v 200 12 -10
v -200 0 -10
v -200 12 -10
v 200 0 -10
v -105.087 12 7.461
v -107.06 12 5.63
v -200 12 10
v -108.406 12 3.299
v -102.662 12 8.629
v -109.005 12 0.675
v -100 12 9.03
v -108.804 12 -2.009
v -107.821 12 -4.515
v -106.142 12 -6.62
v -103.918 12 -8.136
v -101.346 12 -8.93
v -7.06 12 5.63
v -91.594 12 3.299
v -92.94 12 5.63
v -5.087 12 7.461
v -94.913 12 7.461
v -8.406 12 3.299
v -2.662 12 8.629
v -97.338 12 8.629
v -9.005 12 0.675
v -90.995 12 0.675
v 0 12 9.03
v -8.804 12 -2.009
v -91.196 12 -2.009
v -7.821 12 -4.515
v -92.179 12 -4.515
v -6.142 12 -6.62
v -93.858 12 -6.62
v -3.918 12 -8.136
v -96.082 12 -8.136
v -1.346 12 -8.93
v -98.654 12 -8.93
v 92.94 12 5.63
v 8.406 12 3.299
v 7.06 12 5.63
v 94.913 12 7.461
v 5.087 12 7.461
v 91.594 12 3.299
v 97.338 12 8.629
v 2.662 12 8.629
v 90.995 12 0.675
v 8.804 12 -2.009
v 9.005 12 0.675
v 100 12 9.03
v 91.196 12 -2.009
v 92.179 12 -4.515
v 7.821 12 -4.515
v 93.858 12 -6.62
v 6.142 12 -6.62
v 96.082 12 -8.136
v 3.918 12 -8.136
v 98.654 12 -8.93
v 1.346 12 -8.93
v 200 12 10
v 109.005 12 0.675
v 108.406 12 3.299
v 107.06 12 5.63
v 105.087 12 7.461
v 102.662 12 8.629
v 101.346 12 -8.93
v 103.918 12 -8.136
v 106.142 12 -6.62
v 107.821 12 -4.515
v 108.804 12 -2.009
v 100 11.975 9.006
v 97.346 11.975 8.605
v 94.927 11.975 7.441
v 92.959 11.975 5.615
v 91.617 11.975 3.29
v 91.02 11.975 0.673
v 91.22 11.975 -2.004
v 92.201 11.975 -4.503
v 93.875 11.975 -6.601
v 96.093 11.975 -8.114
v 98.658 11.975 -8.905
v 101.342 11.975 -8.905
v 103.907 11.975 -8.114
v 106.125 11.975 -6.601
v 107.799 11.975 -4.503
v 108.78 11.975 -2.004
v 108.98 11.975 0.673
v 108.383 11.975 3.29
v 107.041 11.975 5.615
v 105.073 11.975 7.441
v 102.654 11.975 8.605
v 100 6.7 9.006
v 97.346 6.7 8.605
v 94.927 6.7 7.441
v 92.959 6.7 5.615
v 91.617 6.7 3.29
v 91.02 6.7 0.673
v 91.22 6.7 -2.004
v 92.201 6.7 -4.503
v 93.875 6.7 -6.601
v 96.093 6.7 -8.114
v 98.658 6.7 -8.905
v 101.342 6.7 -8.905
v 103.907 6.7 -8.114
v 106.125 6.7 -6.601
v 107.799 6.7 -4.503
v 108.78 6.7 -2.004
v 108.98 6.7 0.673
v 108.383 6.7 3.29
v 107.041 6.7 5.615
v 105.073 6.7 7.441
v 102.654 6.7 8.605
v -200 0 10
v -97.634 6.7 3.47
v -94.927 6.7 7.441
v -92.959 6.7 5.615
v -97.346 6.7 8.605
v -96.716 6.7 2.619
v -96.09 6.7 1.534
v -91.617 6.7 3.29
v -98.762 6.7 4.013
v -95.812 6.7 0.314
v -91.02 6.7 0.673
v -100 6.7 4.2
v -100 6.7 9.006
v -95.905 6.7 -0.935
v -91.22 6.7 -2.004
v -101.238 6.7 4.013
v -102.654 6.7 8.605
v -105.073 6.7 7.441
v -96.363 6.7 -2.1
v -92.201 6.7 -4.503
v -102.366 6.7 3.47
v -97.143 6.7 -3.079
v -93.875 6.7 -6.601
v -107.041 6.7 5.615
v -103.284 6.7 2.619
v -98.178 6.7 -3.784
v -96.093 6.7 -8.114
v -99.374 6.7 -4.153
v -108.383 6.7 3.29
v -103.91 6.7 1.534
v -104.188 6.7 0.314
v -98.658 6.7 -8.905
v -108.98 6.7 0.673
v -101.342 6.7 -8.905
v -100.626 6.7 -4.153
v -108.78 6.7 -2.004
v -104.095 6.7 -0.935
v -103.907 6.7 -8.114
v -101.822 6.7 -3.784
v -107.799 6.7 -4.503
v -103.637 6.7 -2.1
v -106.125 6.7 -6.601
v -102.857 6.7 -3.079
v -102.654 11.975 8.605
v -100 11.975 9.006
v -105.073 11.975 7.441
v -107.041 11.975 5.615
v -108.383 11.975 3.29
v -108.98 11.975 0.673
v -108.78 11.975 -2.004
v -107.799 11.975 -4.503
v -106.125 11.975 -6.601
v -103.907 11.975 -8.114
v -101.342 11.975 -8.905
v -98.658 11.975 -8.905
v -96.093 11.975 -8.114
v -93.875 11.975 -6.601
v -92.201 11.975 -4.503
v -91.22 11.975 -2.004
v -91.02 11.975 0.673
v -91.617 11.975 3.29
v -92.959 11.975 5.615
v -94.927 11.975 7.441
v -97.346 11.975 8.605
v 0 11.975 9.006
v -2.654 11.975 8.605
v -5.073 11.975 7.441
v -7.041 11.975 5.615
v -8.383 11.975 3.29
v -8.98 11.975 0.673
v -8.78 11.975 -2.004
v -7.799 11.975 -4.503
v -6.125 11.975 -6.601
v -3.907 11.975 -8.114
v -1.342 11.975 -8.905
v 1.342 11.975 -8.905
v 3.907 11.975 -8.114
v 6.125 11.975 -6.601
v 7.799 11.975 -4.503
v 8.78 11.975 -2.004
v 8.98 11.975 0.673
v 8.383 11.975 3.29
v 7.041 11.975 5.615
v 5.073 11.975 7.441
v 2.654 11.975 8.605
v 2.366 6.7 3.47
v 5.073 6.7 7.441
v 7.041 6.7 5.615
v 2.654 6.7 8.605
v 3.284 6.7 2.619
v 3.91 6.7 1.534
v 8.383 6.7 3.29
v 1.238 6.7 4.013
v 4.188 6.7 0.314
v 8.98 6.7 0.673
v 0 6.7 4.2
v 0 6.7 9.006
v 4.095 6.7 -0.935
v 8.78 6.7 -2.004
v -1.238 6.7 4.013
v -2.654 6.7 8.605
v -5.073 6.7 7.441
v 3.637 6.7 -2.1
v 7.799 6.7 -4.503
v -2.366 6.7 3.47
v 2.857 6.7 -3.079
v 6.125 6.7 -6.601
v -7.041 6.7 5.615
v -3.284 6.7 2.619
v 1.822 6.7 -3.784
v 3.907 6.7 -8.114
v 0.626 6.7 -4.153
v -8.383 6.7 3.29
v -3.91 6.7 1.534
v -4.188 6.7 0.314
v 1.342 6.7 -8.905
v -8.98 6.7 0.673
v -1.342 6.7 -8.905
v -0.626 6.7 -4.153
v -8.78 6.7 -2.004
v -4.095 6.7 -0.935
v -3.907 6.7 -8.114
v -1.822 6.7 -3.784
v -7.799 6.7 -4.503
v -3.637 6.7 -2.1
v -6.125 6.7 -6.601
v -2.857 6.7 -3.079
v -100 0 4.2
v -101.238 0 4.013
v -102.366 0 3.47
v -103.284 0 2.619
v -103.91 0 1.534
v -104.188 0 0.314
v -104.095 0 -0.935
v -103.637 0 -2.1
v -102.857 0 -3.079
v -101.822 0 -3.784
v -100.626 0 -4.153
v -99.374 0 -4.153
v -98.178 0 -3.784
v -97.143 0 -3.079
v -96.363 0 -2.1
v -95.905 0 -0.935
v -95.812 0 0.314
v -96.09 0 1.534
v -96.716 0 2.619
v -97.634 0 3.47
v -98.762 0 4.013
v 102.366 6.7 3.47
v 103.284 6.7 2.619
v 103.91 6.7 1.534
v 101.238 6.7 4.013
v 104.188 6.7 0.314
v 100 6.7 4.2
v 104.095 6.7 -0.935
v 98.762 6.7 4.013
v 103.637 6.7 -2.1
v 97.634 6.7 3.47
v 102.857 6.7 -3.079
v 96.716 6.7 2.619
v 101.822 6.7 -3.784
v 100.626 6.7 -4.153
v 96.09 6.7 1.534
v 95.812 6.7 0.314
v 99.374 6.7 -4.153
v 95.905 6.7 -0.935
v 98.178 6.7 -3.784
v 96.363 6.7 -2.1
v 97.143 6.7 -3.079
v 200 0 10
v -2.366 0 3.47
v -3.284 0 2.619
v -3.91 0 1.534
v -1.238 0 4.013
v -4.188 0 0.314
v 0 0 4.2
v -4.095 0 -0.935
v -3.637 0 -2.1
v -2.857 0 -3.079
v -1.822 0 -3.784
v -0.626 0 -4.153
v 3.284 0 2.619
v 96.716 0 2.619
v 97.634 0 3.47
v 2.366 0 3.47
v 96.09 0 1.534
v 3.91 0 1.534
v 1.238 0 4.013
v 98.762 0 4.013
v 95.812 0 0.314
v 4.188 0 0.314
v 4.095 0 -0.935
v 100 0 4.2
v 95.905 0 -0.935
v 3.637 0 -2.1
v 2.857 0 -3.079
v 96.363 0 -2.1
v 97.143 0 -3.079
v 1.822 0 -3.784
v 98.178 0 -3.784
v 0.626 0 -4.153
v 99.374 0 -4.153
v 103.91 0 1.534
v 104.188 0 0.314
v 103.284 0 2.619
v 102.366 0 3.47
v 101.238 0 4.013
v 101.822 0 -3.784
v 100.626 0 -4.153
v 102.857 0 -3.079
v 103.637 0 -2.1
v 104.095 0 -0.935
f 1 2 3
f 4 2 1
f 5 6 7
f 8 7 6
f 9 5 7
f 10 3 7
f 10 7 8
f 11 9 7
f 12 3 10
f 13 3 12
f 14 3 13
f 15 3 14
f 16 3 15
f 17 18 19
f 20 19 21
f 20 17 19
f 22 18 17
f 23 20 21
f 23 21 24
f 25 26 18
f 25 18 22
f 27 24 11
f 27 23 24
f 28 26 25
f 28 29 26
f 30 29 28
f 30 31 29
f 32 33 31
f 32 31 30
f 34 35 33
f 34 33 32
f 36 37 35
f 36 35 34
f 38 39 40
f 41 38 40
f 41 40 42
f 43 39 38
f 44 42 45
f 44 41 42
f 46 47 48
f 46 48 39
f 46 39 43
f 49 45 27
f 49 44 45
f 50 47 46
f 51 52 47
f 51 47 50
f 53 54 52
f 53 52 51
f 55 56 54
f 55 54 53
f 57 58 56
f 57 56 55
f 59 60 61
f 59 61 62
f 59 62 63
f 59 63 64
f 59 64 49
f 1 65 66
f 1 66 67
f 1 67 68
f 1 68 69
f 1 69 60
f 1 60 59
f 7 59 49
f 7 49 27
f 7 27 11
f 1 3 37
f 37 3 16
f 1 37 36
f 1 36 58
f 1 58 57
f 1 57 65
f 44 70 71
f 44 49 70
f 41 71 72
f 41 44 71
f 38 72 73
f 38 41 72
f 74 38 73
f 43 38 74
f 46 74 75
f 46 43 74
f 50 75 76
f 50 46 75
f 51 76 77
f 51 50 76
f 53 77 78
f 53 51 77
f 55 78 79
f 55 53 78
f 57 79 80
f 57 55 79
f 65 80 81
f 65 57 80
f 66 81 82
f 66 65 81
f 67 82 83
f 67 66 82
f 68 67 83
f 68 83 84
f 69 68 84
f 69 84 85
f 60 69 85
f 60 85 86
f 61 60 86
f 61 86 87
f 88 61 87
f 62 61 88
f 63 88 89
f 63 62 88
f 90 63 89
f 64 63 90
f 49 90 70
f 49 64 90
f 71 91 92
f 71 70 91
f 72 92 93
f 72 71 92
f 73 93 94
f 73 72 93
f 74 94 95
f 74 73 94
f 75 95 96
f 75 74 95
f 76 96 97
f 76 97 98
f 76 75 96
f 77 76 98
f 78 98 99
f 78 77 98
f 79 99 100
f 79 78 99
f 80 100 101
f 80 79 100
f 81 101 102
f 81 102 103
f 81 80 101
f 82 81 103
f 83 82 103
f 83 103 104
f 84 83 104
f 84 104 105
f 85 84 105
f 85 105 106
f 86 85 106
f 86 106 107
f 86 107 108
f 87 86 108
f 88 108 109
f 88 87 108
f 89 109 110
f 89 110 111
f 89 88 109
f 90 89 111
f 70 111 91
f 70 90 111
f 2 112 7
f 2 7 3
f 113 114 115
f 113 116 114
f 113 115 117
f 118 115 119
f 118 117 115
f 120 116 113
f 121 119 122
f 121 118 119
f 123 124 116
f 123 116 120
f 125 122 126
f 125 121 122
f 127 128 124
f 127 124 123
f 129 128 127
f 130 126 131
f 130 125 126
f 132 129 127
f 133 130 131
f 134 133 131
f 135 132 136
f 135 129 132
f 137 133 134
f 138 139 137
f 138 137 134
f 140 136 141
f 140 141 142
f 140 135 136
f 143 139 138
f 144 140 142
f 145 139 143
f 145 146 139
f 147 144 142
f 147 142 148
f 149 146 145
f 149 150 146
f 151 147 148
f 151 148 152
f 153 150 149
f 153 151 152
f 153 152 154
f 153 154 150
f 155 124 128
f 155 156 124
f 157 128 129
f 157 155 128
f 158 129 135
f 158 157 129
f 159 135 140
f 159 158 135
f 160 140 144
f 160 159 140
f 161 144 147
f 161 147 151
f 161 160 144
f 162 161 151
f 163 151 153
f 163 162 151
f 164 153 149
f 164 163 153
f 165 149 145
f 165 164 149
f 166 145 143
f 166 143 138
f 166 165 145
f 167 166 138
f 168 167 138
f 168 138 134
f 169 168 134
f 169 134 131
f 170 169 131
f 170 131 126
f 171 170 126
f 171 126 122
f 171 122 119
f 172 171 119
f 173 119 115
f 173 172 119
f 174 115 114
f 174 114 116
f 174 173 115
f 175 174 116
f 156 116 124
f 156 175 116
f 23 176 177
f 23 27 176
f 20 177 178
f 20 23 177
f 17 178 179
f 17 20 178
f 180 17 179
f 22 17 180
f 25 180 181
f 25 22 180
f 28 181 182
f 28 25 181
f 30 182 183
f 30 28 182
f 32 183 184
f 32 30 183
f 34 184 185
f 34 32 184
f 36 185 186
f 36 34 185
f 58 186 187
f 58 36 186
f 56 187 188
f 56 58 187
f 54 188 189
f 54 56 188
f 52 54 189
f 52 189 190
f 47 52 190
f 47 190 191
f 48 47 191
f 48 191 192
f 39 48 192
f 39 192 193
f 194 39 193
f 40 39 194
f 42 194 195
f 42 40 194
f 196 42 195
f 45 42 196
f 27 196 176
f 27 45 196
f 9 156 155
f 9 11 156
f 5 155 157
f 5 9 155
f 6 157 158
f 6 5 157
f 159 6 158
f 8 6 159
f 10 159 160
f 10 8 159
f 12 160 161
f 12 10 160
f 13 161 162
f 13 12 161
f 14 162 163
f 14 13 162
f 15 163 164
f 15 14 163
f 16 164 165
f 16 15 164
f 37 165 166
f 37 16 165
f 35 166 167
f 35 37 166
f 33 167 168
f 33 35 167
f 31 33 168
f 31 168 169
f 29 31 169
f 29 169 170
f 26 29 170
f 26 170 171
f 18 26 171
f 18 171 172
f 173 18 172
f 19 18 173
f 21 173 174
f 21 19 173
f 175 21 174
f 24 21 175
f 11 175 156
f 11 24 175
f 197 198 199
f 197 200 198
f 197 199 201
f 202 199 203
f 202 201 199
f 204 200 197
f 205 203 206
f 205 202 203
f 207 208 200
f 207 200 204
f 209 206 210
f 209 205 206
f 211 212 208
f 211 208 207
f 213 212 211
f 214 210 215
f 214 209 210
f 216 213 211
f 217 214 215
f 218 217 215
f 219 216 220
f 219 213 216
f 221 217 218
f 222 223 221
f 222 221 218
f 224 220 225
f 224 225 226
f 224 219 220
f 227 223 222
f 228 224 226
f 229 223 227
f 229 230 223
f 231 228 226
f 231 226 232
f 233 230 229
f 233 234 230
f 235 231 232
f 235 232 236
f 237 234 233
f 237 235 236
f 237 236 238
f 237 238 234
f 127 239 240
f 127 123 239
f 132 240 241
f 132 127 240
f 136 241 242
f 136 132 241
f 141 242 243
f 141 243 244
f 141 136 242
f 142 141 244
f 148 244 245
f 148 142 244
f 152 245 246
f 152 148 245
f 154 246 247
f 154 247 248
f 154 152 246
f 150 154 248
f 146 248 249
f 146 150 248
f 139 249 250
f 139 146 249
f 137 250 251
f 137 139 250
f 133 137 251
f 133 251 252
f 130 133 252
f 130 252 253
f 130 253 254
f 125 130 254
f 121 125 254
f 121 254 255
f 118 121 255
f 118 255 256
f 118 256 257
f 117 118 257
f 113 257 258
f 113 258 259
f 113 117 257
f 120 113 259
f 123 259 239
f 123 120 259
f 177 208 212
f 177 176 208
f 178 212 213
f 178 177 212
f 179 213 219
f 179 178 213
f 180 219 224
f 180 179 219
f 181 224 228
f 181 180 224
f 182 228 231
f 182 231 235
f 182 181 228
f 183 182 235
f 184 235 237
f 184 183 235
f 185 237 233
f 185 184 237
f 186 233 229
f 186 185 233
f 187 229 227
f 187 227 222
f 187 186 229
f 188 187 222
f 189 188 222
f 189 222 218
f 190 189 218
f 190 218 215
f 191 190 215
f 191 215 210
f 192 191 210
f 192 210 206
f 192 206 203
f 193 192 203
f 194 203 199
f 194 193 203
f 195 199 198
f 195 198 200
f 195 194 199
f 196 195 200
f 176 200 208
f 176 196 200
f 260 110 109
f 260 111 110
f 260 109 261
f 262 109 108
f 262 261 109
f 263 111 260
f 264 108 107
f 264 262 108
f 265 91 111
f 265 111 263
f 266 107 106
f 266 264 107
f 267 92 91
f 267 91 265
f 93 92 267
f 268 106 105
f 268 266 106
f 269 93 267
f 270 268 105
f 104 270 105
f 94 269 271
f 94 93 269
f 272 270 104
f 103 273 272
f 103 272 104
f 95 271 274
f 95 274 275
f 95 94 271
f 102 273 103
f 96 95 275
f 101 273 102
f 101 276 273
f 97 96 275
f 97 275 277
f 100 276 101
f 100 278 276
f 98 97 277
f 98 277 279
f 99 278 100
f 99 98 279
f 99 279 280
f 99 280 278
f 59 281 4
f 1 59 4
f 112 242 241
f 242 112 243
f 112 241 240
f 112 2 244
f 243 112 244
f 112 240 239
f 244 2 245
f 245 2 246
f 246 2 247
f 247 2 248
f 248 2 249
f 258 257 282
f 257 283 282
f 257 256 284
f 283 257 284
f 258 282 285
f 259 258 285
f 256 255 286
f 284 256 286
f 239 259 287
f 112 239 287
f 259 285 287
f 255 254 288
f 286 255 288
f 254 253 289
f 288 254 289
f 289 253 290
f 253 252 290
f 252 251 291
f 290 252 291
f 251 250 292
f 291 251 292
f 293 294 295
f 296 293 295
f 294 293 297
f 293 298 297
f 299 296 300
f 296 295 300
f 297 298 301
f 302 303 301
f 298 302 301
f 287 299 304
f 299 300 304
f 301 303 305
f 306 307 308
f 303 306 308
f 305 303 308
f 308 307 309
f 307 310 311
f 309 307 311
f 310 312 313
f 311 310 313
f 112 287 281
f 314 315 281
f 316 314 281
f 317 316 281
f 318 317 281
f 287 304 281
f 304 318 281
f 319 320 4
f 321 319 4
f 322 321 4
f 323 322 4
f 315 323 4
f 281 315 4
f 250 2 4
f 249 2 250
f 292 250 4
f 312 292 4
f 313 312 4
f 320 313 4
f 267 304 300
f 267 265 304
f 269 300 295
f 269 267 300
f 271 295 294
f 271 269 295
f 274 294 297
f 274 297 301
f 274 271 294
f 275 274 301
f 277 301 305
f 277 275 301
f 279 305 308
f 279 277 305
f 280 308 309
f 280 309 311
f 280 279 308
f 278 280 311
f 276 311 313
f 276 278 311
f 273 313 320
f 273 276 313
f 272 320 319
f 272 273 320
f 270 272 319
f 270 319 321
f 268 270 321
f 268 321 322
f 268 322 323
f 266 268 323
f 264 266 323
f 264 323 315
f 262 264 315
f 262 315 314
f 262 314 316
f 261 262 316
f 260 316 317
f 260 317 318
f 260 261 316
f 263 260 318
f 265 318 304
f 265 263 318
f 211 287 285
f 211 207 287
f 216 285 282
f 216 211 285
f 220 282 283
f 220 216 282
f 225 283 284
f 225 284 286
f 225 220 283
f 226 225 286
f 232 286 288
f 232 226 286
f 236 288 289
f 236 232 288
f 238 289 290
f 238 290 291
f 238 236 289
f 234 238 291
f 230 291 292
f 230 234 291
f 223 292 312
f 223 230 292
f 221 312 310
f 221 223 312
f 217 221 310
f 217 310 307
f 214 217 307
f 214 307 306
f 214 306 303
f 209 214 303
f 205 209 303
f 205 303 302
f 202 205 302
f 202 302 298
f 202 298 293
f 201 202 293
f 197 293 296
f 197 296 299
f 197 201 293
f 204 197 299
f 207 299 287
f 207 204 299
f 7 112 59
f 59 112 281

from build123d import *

# Parameters (mm, degrees)
SKETCH1_W                              = 400
SKETCH1_H                              = 20
BOSS_EXTRUDE1_DEPTH                    = 12
CBORE_FOR_M8_HEX_HEAD_BOLT1_AT_2_COUNT = 2
CBORE_FOR_M8_HEX_HEAD_BOLT1_AT_2_PITCH = 100
CBORE_FOR_M8_HEX_HEAD_BOLT1_AT_3_COUNT = 2
CBORE_FOR_M8_HEX_HEAD_BOLT1_AT_3_PITCH = 100


with BuildPart() as part:
    # Sketch1 → Boss-Extrude1 (new body)
    with BuildSketch(Plane(origin=(0, 0, 0), x_dir=(1, 0, 0), z_dir=(0, 1, 0))):
        Rectangle(SKETCH1_W, SKETCH1_H)
    extrude(amount=BOSS_EXTRUDE1_DEPTH)

    # Sketch5 → CBORE for M8 Hex Head Bolt1 (revolve, cut)
    with BuildSketch(Plane(origin=(0, 12, 0), x_dir=(0, 0, 1), z_dir=(1, 0, 0))):
        Polygon((0, 0), (0, 12), (4.2, 12), (4.2, 5.3), (9.0055, 5.3), (9.0055, 0.025), (9.0305, 0), align=None)
    cbore_for_m8_hex_head_bolt1 = revolve(axis=Axis((0, 18.35, 0), (0, -1, 0)), mode=Mode.SUBTRACT)

    # CBORE for M8 Hex Head Bolt1 at 2: CBORE for M8 Hex Head Bolt1 ×2
    with Locations(*[(i * CBORE_FOR_M8_HEX_HEAD_BOLT1_AT_2_PITCH, 0, 0) for i in range(1, CBORE_FOR_M8_HEX_HEAD_BOLT1_AT_2_COUNT)]):
        add(cbore_for_m8_hex_head_bolt1, mode=Mode.SUBTRACT)

    # CBORE for M8 Hex Head Bolt1 at 3: CBORE for M8 Hex Head Bolt1 ×2
    with Locations(*[(-i * CBORE_FOR_M8_HEX_HEAD_BOLT1_AT_3_PITCH, 0, 0) for i in range(1, CBORE_FOR_M8_HEX_HEAD_BOLT1_AT_3_COUNT)]):
        add(cbore_for_m8_hex_head_bolt1, mode=Mode.SUBTRACT)


solid = part.part
